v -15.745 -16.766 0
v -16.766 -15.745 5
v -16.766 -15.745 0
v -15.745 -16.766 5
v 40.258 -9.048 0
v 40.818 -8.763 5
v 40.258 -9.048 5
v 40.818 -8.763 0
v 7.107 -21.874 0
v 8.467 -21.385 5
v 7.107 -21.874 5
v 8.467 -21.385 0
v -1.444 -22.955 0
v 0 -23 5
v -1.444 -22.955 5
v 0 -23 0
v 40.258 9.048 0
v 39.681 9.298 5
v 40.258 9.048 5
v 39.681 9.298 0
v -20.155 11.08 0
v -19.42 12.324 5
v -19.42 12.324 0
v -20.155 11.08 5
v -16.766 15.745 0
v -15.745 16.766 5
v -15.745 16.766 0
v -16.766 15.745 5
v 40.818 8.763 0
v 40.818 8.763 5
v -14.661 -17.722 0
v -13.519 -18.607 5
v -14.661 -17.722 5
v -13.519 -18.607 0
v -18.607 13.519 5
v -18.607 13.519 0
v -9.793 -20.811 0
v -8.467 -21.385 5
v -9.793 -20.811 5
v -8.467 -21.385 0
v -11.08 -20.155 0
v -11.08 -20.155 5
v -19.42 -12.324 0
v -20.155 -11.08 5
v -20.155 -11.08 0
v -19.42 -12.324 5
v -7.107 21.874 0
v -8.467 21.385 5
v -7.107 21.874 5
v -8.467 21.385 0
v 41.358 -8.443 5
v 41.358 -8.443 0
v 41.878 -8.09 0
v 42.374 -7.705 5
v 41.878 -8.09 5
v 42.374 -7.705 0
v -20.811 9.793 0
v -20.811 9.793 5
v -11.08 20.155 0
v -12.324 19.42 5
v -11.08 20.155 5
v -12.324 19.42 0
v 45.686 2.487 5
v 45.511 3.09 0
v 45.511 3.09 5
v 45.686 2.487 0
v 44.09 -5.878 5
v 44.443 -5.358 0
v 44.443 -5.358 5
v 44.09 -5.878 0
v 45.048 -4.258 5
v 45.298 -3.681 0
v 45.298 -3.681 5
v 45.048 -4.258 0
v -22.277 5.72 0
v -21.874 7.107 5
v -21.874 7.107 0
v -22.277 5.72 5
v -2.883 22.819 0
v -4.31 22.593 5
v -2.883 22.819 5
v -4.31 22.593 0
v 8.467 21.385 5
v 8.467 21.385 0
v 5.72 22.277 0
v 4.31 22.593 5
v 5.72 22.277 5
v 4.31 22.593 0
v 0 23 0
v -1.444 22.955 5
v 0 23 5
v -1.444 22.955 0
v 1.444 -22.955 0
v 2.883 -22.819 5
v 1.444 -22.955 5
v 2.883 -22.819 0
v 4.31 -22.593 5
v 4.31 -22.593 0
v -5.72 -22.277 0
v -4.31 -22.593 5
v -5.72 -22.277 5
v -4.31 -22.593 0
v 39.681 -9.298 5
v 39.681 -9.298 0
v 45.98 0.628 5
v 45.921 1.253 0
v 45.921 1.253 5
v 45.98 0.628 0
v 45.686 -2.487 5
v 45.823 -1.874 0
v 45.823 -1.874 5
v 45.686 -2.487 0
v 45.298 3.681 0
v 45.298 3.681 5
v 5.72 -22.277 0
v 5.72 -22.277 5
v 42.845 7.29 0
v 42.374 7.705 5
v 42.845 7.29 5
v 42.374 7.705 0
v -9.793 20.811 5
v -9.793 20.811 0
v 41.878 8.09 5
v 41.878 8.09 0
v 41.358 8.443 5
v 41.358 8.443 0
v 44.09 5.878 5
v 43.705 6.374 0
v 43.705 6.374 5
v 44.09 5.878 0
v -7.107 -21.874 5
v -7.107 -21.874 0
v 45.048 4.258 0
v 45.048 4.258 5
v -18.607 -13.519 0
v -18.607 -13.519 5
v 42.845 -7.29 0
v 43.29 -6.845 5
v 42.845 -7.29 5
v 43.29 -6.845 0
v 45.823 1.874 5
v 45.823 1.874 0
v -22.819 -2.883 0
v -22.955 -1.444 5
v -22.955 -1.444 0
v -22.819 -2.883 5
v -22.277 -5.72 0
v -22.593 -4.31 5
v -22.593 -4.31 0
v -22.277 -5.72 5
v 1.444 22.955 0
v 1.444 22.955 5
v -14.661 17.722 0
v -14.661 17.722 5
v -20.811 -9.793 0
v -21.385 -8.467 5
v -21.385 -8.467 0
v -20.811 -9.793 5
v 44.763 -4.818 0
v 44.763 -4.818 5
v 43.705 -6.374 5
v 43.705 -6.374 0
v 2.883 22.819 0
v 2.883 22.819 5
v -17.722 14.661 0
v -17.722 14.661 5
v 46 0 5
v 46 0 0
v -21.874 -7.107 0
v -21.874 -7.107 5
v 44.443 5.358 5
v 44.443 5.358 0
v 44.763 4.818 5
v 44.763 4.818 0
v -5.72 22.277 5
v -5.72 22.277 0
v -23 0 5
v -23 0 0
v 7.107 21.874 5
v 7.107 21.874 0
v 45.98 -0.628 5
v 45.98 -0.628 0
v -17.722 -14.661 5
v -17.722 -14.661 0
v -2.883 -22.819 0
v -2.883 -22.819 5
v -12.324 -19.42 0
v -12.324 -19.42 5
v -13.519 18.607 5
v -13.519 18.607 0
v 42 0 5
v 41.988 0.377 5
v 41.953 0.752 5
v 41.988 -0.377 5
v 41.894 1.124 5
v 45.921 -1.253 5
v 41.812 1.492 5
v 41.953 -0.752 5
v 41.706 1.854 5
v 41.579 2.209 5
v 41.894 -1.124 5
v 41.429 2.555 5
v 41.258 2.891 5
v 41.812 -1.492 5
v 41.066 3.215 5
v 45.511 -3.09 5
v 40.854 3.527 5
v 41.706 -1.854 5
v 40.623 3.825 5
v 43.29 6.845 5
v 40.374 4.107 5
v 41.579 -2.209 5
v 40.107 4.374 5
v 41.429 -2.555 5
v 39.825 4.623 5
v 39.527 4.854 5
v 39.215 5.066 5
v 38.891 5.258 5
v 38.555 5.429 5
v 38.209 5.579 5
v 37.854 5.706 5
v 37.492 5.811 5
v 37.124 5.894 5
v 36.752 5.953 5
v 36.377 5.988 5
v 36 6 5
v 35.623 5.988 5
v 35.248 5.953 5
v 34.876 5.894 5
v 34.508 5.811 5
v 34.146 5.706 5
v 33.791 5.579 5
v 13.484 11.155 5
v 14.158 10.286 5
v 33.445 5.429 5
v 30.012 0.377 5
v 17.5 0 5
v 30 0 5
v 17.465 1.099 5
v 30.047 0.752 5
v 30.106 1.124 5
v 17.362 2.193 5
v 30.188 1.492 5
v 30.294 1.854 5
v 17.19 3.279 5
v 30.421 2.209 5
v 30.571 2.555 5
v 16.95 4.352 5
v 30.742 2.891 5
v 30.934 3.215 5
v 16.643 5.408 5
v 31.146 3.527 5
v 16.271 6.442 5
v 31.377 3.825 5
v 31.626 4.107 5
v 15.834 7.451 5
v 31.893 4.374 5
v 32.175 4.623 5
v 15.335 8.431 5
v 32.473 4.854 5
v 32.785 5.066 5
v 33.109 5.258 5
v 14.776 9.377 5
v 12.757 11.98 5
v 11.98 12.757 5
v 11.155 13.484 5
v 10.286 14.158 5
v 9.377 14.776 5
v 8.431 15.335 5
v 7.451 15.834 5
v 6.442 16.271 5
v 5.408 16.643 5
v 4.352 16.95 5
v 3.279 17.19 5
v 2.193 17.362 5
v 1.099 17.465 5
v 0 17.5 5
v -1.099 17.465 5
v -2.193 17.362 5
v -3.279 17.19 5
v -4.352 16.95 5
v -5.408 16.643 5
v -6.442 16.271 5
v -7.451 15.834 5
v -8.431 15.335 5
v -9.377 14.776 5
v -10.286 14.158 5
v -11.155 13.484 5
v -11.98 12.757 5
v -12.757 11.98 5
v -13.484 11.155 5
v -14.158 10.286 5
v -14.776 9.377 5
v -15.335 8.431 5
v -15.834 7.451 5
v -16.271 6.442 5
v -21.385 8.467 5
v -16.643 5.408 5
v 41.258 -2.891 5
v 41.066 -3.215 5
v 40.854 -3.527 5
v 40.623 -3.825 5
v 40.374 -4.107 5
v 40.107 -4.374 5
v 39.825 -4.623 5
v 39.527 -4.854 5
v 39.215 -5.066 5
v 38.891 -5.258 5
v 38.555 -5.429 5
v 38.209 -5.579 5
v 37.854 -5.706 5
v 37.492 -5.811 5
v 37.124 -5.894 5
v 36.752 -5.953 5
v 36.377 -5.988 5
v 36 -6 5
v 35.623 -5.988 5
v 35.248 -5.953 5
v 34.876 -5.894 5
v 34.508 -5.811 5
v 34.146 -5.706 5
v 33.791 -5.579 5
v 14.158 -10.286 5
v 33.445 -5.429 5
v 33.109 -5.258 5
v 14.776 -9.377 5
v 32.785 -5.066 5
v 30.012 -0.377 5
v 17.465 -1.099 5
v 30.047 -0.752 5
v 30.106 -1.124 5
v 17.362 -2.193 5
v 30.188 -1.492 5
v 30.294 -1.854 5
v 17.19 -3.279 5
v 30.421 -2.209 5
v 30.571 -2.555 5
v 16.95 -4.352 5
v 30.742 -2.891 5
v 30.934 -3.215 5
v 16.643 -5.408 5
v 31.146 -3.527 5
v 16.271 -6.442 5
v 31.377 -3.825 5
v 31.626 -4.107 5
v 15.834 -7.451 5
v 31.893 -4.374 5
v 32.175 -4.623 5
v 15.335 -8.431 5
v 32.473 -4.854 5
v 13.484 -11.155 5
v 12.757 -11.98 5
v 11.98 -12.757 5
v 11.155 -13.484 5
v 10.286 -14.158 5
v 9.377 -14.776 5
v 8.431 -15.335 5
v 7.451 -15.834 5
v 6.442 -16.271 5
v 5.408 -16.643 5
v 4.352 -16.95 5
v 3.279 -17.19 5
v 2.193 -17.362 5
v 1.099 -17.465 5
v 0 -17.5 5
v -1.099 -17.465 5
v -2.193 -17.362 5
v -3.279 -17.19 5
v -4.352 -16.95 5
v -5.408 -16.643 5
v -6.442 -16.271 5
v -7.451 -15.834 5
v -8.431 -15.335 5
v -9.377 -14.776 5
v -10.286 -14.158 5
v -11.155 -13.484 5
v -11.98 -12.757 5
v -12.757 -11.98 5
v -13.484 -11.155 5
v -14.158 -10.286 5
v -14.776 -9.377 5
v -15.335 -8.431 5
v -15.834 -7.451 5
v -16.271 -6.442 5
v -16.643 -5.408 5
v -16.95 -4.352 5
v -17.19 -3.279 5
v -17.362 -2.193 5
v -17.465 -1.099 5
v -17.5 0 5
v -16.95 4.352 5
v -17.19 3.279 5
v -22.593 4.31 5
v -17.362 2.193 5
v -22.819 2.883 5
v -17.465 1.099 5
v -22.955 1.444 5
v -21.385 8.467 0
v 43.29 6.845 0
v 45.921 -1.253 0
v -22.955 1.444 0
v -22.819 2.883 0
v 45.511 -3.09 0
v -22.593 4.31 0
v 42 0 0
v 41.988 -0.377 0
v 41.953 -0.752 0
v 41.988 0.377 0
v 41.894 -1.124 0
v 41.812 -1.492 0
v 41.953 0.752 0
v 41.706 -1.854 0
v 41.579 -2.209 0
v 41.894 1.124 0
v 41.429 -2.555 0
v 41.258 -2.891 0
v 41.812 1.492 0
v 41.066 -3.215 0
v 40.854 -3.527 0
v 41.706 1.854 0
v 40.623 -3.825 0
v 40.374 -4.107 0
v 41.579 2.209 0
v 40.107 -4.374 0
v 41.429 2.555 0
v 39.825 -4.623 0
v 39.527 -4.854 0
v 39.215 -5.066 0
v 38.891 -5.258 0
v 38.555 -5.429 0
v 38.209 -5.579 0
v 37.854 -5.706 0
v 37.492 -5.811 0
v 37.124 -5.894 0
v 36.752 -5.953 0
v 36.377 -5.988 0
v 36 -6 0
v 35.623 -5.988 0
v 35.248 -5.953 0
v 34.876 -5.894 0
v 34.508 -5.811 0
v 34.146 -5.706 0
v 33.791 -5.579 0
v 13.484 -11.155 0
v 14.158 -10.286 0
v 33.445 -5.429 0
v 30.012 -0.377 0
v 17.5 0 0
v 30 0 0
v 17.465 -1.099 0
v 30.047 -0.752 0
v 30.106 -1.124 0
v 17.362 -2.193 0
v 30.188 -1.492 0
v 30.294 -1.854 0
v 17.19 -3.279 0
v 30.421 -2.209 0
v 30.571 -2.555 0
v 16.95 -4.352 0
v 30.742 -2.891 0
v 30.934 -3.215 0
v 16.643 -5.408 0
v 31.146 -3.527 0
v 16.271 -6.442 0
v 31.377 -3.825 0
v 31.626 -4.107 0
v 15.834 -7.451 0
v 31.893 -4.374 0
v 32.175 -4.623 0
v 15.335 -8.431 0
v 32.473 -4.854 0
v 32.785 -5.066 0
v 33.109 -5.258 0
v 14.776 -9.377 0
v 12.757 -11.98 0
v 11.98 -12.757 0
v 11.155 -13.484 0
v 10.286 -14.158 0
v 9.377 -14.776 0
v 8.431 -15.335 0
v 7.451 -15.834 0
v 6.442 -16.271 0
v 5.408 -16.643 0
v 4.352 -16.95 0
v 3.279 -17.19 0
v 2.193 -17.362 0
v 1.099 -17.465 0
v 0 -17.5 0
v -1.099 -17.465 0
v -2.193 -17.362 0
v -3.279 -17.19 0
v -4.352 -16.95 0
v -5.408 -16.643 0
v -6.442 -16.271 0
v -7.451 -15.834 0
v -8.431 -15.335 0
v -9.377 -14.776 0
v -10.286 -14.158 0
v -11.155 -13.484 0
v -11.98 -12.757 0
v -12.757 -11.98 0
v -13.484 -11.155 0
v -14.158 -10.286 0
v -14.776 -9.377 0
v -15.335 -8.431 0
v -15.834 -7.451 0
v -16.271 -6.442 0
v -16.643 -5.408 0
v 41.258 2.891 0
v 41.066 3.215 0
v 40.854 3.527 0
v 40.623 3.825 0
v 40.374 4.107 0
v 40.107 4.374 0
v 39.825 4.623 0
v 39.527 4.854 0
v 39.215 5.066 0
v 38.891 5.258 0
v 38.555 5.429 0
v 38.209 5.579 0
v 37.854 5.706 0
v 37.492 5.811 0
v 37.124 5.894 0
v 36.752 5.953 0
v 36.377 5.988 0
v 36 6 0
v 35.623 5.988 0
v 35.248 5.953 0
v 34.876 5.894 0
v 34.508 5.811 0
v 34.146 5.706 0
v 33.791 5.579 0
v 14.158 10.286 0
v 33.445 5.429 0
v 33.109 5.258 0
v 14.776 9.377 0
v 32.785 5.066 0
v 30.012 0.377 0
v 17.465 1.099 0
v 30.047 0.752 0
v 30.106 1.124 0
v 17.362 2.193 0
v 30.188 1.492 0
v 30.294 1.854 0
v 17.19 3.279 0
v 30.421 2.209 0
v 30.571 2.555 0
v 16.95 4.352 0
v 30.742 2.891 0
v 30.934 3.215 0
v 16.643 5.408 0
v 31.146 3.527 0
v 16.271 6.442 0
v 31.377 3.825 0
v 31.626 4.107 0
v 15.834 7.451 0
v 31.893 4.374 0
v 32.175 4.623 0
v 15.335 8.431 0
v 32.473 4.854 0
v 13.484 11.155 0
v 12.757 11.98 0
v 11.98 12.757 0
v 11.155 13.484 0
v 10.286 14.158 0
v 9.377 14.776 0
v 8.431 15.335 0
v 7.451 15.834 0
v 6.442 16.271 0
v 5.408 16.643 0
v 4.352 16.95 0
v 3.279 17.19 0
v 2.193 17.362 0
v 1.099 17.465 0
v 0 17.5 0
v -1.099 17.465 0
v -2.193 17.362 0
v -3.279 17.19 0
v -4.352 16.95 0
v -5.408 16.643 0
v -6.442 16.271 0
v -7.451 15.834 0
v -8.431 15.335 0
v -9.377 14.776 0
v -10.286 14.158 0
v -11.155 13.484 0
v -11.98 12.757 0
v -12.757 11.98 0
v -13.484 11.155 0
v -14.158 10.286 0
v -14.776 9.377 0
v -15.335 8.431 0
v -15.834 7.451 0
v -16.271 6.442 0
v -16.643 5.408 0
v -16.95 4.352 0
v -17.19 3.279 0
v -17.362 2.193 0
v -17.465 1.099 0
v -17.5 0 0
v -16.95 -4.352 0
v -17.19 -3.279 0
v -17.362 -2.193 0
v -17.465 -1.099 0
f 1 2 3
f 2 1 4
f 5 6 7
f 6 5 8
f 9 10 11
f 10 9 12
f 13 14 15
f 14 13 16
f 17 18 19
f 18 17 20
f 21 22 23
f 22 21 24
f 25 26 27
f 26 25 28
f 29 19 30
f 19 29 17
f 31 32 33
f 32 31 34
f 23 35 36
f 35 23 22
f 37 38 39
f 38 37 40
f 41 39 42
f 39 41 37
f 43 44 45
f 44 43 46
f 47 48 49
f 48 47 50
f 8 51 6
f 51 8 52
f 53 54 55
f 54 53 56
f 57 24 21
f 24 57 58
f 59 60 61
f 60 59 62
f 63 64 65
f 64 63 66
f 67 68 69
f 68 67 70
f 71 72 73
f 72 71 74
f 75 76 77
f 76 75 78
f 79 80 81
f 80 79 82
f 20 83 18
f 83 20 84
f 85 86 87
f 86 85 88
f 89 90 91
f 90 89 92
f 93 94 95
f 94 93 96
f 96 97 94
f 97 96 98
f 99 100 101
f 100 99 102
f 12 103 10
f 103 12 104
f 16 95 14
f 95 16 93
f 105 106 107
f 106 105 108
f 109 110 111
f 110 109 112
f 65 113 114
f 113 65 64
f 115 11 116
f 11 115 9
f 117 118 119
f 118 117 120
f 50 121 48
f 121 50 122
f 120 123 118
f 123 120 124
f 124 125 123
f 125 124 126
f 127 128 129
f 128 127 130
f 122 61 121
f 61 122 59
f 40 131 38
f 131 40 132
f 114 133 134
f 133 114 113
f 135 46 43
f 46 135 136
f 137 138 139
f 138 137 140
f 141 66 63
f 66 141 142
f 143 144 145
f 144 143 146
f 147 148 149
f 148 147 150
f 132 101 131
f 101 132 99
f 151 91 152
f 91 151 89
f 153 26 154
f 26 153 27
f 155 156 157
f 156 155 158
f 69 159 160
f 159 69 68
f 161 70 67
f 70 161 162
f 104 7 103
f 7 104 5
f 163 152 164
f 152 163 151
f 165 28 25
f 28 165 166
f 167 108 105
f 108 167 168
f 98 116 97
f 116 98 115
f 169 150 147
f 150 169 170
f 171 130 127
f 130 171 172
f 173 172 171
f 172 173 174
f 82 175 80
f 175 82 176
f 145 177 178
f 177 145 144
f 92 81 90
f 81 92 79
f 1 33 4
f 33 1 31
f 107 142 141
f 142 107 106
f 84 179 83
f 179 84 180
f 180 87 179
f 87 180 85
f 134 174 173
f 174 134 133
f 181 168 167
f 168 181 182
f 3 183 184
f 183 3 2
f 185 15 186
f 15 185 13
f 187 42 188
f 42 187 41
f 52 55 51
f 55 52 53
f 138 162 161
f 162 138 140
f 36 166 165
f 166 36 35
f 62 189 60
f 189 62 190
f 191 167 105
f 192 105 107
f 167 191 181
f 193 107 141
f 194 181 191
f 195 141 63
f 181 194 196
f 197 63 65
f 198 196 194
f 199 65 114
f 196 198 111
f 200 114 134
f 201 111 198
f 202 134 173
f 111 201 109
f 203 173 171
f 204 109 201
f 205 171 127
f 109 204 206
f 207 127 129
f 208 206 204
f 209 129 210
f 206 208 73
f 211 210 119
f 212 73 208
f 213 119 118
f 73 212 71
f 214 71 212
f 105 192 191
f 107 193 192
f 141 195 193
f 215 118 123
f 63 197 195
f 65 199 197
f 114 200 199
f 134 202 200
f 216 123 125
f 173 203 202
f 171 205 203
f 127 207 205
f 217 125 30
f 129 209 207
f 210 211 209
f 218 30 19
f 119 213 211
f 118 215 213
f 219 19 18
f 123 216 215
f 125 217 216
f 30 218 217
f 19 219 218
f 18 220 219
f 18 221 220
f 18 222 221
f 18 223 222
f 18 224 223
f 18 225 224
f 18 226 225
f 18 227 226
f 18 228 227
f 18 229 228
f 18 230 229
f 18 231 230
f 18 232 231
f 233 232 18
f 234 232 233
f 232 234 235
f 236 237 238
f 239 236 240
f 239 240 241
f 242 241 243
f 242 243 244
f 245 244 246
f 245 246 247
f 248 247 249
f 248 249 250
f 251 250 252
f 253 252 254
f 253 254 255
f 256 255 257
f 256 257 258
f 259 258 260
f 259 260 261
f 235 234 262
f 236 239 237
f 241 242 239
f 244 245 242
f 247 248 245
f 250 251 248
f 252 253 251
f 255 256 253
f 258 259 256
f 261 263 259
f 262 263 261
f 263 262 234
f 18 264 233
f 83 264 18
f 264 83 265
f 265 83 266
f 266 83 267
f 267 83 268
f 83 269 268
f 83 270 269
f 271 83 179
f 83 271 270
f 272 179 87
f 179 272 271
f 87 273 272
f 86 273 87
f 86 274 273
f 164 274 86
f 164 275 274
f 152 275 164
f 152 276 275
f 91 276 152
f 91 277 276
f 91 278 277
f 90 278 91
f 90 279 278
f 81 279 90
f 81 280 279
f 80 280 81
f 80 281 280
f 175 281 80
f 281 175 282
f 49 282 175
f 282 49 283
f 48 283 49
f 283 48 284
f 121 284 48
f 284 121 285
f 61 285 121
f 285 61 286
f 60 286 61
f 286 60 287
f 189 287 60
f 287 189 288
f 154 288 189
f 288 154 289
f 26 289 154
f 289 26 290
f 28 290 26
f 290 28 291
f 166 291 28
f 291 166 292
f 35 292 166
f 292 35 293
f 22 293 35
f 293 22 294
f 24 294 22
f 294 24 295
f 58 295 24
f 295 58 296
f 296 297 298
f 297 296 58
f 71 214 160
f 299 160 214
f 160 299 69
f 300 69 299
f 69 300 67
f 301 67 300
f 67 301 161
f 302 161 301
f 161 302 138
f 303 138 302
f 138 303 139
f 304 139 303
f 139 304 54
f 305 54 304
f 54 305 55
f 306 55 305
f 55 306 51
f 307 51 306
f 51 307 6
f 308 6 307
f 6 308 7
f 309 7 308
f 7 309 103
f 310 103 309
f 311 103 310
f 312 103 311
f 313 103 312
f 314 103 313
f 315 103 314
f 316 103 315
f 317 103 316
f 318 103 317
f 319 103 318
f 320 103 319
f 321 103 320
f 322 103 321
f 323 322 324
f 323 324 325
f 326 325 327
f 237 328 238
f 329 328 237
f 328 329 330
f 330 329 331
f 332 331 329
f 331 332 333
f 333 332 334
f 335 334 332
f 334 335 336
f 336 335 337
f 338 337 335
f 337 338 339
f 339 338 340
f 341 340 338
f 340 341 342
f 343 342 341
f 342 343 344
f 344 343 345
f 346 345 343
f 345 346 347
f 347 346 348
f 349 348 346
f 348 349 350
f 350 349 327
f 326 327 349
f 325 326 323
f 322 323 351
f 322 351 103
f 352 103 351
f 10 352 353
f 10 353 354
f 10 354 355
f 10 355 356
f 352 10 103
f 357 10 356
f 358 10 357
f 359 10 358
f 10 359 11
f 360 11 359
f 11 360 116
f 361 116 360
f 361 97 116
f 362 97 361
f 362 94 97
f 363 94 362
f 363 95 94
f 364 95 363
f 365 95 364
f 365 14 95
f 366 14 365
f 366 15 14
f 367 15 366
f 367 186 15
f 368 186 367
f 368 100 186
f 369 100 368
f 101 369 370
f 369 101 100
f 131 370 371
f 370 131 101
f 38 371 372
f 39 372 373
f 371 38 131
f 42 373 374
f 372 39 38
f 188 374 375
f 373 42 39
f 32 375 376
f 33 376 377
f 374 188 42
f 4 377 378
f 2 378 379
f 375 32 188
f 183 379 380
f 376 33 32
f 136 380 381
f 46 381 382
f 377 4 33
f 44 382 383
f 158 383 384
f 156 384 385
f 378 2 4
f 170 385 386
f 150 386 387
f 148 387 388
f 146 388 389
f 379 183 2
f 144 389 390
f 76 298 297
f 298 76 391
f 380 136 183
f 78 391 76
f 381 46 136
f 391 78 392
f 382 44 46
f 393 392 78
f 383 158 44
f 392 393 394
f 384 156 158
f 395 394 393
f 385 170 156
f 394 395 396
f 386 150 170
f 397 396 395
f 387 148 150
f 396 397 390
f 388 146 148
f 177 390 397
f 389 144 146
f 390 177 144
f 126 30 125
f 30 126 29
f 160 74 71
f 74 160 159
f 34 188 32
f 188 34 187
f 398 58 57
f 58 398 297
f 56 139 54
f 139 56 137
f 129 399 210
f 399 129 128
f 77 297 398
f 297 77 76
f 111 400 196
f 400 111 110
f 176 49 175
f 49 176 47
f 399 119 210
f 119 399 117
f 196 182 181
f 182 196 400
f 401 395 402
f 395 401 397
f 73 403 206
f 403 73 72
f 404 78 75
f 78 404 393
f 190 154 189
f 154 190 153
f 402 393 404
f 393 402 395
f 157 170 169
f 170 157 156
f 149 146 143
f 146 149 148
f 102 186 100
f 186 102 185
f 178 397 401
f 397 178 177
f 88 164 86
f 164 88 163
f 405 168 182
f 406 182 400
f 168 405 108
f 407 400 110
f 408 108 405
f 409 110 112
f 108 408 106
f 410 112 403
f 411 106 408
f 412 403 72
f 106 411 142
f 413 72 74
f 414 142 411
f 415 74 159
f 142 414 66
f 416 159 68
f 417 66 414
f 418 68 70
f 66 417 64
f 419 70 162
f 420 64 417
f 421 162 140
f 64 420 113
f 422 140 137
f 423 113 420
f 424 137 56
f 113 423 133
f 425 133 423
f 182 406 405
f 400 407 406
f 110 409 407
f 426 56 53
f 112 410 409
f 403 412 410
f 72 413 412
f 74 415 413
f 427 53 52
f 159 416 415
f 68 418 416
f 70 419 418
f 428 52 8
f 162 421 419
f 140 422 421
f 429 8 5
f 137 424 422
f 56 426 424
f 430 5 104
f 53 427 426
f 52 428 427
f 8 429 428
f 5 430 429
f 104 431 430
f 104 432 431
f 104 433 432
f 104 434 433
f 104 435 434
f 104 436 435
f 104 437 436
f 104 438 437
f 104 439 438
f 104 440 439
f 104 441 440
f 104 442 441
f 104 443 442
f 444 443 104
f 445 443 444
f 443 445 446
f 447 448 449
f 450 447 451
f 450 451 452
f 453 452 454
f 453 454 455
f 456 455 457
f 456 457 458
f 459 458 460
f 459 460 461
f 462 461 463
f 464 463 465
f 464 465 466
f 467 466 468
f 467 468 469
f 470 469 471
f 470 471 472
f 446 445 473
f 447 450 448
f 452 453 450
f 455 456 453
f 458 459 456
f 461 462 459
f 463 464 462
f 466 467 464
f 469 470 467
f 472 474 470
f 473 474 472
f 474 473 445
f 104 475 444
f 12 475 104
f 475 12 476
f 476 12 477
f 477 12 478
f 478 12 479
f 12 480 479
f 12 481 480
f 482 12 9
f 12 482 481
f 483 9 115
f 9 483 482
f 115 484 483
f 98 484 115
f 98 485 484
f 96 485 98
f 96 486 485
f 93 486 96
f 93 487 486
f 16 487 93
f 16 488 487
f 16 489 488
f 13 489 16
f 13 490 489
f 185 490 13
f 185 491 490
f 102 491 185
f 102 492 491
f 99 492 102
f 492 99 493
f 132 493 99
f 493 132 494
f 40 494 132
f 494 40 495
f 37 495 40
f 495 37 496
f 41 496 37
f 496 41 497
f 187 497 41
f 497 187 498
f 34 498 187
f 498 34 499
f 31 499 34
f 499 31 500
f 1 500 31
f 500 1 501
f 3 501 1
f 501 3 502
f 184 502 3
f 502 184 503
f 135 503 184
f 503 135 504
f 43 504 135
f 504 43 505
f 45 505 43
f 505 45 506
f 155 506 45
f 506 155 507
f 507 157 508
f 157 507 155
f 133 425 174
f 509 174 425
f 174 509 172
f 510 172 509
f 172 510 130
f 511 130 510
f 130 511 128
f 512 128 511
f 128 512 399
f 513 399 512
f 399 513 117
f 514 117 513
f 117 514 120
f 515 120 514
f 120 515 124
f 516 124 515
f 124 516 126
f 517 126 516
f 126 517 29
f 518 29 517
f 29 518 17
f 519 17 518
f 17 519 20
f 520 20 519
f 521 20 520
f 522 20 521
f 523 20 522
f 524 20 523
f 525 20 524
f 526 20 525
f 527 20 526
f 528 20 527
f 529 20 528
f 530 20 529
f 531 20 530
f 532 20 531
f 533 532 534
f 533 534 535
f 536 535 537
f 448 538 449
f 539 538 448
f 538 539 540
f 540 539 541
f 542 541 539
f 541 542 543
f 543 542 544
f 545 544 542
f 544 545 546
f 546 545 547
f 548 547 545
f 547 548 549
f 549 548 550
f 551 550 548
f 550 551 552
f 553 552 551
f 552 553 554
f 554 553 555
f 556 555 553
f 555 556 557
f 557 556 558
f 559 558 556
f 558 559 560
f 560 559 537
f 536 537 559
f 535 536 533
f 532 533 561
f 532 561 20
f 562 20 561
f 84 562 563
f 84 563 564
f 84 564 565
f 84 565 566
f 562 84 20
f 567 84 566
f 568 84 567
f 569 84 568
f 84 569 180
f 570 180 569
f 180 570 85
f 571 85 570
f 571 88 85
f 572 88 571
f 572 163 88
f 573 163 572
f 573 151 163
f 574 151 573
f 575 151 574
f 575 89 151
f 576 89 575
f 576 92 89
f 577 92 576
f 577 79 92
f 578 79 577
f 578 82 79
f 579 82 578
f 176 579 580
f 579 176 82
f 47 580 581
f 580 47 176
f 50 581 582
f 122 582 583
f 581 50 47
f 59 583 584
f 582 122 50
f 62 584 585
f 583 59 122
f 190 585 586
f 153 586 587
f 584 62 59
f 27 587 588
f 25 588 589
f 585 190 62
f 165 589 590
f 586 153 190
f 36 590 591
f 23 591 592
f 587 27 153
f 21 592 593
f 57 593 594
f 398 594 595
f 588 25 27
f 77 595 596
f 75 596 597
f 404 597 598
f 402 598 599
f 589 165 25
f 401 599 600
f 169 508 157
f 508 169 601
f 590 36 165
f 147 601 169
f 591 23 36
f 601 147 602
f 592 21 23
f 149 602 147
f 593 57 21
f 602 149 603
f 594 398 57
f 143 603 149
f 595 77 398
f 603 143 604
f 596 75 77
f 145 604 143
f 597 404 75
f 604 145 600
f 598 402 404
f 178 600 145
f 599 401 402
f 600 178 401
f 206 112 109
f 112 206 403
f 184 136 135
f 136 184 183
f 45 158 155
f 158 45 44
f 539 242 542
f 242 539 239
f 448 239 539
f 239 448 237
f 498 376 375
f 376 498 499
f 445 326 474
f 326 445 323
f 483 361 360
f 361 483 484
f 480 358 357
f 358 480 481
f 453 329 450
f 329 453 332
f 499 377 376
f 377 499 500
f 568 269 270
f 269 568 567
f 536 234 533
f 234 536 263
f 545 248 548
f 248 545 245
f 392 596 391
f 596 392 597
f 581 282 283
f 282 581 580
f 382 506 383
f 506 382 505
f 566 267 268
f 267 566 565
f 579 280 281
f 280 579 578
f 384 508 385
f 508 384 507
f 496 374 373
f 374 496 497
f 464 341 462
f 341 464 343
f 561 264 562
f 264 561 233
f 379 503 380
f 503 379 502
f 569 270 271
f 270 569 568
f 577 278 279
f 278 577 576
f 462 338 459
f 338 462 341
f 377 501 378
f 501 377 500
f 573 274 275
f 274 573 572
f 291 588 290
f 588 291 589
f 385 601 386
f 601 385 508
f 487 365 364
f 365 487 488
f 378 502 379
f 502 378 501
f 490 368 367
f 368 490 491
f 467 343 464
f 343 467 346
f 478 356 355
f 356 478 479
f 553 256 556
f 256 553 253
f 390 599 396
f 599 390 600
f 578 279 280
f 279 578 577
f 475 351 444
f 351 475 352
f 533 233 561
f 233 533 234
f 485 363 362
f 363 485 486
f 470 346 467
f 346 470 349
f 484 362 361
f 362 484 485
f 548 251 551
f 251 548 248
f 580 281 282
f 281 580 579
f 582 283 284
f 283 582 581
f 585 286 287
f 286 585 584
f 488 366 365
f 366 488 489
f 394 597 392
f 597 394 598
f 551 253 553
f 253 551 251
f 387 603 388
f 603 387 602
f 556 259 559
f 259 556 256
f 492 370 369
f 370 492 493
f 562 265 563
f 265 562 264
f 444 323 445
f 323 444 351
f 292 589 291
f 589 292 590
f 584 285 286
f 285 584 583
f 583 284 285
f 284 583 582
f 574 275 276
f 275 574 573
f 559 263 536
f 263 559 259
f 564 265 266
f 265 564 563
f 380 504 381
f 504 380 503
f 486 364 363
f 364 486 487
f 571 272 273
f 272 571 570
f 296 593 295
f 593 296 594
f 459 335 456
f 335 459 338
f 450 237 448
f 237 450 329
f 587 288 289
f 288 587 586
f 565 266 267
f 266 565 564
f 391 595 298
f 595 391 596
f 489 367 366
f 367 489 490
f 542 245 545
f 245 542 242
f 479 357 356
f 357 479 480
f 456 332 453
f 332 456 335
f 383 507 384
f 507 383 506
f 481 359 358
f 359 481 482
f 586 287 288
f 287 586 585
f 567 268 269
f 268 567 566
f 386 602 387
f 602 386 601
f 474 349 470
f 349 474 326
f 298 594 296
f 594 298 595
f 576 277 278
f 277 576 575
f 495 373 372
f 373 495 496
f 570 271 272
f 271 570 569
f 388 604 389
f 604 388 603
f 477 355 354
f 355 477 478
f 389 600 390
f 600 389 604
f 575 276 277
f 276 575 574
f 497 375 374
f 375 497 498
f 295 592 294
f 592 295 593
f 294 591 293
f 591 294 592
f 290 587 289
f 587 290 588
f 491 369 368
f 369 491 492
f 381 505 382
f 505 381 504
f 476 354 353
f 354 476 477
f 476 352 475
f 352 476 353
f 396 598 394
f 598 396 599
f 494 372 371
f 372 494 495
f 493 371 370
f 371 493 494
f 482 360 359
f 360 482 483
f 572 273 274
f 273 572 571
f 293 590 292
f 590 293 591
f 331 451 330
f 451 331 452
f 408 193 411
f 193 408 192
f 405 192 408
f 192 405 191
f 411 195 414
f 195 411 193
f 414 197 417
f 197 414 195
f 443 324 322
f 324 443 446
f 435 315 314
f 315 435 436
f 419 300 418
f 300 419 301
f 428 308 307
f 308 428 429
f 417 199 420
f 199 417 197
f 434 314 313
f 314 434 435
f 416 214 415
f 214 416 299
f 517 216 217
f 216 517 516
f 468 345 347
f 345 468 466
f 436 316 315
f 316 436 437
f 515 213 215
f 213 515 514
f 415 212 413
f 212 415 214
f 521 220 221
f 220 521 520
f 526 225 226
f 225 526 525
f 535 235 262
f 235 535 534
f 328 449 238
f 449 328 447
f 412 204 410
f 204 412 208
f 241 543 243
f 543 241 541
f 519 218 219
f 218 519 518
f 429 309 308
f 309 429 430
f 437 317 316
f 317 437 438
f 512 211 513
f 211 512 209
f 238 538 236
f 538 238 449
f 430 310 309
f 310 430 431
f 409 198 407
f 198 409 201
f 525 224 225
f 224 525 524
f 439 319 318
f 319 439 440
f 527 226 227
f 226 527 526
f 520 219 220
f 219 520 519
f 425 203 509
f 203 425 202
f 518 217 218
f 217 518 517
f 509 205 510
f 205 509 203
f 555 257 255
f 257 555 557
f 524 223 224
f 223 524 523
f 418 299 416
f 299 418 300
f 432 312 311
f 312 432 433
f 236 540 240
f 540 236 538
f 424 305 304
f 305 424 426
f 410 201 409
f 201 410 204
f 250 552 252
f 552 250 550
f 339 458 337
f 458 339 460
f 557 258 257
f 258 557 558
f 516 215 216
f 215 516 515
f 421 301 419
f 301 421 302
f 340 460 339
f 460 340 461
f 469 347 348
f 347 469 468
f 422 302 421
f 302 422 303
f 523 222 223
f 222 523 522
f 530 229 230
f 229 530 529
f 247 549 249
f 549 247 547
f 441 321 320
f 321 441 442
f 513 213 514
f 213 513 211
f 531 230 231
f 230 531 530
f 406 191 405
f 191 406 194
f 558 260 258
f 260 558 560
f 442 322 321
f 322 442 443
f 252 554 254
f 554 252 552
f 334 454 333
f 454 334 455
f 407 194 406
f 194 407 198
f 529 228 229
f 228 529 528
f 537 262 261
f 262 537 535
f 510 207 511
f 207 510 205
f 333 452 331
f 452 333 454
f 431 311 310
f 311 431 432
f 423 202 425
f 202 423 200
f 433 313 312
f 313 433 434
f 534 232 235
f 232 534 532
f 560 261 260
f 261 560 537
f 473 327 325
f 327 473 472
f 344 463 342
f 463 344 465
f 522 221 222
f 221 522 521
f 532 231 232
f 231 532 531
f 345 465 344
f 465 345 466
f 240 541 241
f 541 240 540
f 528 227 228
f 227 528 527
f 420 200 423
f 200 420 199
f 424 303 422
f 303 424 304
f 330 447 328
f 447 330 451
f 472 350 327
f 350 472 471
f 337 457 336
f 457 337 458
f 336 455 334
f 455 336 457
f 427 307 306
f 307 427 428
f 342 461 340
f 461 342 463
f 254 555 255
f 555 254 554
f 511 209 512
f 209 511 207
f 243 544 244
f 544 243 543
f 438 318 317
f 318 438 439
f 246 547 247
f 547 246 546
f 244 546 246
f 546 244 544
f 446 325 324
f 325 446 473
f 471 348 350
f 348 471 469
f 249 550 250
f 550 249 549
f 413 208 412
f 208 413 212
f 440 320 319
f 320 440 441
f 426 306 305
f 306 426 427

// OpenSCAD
BOTTLE_INNER_DIA = 35;
BOTTLE_OUTER_DIA = 46;

HOLE_INNER_DIA = 12;
HOLE_OUTER_DIA = 20;

HEIGHT = 5;
HOLE_DISTANCE = 36;

$fn = 100;

difference() {
    hull() {
        cylinder(d = BOTTLE_OUTER_DIA, h = HEIGHT);
        translate([HOLE_DISTANCE, 0, 0])
        cylinder(d = HOLE_OUTER_DIA, h = HEIGHT);
    }
    cylinder(d = BOTTLE_INNER_DIA, h = HEIGHT);
    translate([HOLE_DISTANCE, 0, 0])
    cylinder(d = HOLE_INNER_DIA, h = HEIGHT);
}
